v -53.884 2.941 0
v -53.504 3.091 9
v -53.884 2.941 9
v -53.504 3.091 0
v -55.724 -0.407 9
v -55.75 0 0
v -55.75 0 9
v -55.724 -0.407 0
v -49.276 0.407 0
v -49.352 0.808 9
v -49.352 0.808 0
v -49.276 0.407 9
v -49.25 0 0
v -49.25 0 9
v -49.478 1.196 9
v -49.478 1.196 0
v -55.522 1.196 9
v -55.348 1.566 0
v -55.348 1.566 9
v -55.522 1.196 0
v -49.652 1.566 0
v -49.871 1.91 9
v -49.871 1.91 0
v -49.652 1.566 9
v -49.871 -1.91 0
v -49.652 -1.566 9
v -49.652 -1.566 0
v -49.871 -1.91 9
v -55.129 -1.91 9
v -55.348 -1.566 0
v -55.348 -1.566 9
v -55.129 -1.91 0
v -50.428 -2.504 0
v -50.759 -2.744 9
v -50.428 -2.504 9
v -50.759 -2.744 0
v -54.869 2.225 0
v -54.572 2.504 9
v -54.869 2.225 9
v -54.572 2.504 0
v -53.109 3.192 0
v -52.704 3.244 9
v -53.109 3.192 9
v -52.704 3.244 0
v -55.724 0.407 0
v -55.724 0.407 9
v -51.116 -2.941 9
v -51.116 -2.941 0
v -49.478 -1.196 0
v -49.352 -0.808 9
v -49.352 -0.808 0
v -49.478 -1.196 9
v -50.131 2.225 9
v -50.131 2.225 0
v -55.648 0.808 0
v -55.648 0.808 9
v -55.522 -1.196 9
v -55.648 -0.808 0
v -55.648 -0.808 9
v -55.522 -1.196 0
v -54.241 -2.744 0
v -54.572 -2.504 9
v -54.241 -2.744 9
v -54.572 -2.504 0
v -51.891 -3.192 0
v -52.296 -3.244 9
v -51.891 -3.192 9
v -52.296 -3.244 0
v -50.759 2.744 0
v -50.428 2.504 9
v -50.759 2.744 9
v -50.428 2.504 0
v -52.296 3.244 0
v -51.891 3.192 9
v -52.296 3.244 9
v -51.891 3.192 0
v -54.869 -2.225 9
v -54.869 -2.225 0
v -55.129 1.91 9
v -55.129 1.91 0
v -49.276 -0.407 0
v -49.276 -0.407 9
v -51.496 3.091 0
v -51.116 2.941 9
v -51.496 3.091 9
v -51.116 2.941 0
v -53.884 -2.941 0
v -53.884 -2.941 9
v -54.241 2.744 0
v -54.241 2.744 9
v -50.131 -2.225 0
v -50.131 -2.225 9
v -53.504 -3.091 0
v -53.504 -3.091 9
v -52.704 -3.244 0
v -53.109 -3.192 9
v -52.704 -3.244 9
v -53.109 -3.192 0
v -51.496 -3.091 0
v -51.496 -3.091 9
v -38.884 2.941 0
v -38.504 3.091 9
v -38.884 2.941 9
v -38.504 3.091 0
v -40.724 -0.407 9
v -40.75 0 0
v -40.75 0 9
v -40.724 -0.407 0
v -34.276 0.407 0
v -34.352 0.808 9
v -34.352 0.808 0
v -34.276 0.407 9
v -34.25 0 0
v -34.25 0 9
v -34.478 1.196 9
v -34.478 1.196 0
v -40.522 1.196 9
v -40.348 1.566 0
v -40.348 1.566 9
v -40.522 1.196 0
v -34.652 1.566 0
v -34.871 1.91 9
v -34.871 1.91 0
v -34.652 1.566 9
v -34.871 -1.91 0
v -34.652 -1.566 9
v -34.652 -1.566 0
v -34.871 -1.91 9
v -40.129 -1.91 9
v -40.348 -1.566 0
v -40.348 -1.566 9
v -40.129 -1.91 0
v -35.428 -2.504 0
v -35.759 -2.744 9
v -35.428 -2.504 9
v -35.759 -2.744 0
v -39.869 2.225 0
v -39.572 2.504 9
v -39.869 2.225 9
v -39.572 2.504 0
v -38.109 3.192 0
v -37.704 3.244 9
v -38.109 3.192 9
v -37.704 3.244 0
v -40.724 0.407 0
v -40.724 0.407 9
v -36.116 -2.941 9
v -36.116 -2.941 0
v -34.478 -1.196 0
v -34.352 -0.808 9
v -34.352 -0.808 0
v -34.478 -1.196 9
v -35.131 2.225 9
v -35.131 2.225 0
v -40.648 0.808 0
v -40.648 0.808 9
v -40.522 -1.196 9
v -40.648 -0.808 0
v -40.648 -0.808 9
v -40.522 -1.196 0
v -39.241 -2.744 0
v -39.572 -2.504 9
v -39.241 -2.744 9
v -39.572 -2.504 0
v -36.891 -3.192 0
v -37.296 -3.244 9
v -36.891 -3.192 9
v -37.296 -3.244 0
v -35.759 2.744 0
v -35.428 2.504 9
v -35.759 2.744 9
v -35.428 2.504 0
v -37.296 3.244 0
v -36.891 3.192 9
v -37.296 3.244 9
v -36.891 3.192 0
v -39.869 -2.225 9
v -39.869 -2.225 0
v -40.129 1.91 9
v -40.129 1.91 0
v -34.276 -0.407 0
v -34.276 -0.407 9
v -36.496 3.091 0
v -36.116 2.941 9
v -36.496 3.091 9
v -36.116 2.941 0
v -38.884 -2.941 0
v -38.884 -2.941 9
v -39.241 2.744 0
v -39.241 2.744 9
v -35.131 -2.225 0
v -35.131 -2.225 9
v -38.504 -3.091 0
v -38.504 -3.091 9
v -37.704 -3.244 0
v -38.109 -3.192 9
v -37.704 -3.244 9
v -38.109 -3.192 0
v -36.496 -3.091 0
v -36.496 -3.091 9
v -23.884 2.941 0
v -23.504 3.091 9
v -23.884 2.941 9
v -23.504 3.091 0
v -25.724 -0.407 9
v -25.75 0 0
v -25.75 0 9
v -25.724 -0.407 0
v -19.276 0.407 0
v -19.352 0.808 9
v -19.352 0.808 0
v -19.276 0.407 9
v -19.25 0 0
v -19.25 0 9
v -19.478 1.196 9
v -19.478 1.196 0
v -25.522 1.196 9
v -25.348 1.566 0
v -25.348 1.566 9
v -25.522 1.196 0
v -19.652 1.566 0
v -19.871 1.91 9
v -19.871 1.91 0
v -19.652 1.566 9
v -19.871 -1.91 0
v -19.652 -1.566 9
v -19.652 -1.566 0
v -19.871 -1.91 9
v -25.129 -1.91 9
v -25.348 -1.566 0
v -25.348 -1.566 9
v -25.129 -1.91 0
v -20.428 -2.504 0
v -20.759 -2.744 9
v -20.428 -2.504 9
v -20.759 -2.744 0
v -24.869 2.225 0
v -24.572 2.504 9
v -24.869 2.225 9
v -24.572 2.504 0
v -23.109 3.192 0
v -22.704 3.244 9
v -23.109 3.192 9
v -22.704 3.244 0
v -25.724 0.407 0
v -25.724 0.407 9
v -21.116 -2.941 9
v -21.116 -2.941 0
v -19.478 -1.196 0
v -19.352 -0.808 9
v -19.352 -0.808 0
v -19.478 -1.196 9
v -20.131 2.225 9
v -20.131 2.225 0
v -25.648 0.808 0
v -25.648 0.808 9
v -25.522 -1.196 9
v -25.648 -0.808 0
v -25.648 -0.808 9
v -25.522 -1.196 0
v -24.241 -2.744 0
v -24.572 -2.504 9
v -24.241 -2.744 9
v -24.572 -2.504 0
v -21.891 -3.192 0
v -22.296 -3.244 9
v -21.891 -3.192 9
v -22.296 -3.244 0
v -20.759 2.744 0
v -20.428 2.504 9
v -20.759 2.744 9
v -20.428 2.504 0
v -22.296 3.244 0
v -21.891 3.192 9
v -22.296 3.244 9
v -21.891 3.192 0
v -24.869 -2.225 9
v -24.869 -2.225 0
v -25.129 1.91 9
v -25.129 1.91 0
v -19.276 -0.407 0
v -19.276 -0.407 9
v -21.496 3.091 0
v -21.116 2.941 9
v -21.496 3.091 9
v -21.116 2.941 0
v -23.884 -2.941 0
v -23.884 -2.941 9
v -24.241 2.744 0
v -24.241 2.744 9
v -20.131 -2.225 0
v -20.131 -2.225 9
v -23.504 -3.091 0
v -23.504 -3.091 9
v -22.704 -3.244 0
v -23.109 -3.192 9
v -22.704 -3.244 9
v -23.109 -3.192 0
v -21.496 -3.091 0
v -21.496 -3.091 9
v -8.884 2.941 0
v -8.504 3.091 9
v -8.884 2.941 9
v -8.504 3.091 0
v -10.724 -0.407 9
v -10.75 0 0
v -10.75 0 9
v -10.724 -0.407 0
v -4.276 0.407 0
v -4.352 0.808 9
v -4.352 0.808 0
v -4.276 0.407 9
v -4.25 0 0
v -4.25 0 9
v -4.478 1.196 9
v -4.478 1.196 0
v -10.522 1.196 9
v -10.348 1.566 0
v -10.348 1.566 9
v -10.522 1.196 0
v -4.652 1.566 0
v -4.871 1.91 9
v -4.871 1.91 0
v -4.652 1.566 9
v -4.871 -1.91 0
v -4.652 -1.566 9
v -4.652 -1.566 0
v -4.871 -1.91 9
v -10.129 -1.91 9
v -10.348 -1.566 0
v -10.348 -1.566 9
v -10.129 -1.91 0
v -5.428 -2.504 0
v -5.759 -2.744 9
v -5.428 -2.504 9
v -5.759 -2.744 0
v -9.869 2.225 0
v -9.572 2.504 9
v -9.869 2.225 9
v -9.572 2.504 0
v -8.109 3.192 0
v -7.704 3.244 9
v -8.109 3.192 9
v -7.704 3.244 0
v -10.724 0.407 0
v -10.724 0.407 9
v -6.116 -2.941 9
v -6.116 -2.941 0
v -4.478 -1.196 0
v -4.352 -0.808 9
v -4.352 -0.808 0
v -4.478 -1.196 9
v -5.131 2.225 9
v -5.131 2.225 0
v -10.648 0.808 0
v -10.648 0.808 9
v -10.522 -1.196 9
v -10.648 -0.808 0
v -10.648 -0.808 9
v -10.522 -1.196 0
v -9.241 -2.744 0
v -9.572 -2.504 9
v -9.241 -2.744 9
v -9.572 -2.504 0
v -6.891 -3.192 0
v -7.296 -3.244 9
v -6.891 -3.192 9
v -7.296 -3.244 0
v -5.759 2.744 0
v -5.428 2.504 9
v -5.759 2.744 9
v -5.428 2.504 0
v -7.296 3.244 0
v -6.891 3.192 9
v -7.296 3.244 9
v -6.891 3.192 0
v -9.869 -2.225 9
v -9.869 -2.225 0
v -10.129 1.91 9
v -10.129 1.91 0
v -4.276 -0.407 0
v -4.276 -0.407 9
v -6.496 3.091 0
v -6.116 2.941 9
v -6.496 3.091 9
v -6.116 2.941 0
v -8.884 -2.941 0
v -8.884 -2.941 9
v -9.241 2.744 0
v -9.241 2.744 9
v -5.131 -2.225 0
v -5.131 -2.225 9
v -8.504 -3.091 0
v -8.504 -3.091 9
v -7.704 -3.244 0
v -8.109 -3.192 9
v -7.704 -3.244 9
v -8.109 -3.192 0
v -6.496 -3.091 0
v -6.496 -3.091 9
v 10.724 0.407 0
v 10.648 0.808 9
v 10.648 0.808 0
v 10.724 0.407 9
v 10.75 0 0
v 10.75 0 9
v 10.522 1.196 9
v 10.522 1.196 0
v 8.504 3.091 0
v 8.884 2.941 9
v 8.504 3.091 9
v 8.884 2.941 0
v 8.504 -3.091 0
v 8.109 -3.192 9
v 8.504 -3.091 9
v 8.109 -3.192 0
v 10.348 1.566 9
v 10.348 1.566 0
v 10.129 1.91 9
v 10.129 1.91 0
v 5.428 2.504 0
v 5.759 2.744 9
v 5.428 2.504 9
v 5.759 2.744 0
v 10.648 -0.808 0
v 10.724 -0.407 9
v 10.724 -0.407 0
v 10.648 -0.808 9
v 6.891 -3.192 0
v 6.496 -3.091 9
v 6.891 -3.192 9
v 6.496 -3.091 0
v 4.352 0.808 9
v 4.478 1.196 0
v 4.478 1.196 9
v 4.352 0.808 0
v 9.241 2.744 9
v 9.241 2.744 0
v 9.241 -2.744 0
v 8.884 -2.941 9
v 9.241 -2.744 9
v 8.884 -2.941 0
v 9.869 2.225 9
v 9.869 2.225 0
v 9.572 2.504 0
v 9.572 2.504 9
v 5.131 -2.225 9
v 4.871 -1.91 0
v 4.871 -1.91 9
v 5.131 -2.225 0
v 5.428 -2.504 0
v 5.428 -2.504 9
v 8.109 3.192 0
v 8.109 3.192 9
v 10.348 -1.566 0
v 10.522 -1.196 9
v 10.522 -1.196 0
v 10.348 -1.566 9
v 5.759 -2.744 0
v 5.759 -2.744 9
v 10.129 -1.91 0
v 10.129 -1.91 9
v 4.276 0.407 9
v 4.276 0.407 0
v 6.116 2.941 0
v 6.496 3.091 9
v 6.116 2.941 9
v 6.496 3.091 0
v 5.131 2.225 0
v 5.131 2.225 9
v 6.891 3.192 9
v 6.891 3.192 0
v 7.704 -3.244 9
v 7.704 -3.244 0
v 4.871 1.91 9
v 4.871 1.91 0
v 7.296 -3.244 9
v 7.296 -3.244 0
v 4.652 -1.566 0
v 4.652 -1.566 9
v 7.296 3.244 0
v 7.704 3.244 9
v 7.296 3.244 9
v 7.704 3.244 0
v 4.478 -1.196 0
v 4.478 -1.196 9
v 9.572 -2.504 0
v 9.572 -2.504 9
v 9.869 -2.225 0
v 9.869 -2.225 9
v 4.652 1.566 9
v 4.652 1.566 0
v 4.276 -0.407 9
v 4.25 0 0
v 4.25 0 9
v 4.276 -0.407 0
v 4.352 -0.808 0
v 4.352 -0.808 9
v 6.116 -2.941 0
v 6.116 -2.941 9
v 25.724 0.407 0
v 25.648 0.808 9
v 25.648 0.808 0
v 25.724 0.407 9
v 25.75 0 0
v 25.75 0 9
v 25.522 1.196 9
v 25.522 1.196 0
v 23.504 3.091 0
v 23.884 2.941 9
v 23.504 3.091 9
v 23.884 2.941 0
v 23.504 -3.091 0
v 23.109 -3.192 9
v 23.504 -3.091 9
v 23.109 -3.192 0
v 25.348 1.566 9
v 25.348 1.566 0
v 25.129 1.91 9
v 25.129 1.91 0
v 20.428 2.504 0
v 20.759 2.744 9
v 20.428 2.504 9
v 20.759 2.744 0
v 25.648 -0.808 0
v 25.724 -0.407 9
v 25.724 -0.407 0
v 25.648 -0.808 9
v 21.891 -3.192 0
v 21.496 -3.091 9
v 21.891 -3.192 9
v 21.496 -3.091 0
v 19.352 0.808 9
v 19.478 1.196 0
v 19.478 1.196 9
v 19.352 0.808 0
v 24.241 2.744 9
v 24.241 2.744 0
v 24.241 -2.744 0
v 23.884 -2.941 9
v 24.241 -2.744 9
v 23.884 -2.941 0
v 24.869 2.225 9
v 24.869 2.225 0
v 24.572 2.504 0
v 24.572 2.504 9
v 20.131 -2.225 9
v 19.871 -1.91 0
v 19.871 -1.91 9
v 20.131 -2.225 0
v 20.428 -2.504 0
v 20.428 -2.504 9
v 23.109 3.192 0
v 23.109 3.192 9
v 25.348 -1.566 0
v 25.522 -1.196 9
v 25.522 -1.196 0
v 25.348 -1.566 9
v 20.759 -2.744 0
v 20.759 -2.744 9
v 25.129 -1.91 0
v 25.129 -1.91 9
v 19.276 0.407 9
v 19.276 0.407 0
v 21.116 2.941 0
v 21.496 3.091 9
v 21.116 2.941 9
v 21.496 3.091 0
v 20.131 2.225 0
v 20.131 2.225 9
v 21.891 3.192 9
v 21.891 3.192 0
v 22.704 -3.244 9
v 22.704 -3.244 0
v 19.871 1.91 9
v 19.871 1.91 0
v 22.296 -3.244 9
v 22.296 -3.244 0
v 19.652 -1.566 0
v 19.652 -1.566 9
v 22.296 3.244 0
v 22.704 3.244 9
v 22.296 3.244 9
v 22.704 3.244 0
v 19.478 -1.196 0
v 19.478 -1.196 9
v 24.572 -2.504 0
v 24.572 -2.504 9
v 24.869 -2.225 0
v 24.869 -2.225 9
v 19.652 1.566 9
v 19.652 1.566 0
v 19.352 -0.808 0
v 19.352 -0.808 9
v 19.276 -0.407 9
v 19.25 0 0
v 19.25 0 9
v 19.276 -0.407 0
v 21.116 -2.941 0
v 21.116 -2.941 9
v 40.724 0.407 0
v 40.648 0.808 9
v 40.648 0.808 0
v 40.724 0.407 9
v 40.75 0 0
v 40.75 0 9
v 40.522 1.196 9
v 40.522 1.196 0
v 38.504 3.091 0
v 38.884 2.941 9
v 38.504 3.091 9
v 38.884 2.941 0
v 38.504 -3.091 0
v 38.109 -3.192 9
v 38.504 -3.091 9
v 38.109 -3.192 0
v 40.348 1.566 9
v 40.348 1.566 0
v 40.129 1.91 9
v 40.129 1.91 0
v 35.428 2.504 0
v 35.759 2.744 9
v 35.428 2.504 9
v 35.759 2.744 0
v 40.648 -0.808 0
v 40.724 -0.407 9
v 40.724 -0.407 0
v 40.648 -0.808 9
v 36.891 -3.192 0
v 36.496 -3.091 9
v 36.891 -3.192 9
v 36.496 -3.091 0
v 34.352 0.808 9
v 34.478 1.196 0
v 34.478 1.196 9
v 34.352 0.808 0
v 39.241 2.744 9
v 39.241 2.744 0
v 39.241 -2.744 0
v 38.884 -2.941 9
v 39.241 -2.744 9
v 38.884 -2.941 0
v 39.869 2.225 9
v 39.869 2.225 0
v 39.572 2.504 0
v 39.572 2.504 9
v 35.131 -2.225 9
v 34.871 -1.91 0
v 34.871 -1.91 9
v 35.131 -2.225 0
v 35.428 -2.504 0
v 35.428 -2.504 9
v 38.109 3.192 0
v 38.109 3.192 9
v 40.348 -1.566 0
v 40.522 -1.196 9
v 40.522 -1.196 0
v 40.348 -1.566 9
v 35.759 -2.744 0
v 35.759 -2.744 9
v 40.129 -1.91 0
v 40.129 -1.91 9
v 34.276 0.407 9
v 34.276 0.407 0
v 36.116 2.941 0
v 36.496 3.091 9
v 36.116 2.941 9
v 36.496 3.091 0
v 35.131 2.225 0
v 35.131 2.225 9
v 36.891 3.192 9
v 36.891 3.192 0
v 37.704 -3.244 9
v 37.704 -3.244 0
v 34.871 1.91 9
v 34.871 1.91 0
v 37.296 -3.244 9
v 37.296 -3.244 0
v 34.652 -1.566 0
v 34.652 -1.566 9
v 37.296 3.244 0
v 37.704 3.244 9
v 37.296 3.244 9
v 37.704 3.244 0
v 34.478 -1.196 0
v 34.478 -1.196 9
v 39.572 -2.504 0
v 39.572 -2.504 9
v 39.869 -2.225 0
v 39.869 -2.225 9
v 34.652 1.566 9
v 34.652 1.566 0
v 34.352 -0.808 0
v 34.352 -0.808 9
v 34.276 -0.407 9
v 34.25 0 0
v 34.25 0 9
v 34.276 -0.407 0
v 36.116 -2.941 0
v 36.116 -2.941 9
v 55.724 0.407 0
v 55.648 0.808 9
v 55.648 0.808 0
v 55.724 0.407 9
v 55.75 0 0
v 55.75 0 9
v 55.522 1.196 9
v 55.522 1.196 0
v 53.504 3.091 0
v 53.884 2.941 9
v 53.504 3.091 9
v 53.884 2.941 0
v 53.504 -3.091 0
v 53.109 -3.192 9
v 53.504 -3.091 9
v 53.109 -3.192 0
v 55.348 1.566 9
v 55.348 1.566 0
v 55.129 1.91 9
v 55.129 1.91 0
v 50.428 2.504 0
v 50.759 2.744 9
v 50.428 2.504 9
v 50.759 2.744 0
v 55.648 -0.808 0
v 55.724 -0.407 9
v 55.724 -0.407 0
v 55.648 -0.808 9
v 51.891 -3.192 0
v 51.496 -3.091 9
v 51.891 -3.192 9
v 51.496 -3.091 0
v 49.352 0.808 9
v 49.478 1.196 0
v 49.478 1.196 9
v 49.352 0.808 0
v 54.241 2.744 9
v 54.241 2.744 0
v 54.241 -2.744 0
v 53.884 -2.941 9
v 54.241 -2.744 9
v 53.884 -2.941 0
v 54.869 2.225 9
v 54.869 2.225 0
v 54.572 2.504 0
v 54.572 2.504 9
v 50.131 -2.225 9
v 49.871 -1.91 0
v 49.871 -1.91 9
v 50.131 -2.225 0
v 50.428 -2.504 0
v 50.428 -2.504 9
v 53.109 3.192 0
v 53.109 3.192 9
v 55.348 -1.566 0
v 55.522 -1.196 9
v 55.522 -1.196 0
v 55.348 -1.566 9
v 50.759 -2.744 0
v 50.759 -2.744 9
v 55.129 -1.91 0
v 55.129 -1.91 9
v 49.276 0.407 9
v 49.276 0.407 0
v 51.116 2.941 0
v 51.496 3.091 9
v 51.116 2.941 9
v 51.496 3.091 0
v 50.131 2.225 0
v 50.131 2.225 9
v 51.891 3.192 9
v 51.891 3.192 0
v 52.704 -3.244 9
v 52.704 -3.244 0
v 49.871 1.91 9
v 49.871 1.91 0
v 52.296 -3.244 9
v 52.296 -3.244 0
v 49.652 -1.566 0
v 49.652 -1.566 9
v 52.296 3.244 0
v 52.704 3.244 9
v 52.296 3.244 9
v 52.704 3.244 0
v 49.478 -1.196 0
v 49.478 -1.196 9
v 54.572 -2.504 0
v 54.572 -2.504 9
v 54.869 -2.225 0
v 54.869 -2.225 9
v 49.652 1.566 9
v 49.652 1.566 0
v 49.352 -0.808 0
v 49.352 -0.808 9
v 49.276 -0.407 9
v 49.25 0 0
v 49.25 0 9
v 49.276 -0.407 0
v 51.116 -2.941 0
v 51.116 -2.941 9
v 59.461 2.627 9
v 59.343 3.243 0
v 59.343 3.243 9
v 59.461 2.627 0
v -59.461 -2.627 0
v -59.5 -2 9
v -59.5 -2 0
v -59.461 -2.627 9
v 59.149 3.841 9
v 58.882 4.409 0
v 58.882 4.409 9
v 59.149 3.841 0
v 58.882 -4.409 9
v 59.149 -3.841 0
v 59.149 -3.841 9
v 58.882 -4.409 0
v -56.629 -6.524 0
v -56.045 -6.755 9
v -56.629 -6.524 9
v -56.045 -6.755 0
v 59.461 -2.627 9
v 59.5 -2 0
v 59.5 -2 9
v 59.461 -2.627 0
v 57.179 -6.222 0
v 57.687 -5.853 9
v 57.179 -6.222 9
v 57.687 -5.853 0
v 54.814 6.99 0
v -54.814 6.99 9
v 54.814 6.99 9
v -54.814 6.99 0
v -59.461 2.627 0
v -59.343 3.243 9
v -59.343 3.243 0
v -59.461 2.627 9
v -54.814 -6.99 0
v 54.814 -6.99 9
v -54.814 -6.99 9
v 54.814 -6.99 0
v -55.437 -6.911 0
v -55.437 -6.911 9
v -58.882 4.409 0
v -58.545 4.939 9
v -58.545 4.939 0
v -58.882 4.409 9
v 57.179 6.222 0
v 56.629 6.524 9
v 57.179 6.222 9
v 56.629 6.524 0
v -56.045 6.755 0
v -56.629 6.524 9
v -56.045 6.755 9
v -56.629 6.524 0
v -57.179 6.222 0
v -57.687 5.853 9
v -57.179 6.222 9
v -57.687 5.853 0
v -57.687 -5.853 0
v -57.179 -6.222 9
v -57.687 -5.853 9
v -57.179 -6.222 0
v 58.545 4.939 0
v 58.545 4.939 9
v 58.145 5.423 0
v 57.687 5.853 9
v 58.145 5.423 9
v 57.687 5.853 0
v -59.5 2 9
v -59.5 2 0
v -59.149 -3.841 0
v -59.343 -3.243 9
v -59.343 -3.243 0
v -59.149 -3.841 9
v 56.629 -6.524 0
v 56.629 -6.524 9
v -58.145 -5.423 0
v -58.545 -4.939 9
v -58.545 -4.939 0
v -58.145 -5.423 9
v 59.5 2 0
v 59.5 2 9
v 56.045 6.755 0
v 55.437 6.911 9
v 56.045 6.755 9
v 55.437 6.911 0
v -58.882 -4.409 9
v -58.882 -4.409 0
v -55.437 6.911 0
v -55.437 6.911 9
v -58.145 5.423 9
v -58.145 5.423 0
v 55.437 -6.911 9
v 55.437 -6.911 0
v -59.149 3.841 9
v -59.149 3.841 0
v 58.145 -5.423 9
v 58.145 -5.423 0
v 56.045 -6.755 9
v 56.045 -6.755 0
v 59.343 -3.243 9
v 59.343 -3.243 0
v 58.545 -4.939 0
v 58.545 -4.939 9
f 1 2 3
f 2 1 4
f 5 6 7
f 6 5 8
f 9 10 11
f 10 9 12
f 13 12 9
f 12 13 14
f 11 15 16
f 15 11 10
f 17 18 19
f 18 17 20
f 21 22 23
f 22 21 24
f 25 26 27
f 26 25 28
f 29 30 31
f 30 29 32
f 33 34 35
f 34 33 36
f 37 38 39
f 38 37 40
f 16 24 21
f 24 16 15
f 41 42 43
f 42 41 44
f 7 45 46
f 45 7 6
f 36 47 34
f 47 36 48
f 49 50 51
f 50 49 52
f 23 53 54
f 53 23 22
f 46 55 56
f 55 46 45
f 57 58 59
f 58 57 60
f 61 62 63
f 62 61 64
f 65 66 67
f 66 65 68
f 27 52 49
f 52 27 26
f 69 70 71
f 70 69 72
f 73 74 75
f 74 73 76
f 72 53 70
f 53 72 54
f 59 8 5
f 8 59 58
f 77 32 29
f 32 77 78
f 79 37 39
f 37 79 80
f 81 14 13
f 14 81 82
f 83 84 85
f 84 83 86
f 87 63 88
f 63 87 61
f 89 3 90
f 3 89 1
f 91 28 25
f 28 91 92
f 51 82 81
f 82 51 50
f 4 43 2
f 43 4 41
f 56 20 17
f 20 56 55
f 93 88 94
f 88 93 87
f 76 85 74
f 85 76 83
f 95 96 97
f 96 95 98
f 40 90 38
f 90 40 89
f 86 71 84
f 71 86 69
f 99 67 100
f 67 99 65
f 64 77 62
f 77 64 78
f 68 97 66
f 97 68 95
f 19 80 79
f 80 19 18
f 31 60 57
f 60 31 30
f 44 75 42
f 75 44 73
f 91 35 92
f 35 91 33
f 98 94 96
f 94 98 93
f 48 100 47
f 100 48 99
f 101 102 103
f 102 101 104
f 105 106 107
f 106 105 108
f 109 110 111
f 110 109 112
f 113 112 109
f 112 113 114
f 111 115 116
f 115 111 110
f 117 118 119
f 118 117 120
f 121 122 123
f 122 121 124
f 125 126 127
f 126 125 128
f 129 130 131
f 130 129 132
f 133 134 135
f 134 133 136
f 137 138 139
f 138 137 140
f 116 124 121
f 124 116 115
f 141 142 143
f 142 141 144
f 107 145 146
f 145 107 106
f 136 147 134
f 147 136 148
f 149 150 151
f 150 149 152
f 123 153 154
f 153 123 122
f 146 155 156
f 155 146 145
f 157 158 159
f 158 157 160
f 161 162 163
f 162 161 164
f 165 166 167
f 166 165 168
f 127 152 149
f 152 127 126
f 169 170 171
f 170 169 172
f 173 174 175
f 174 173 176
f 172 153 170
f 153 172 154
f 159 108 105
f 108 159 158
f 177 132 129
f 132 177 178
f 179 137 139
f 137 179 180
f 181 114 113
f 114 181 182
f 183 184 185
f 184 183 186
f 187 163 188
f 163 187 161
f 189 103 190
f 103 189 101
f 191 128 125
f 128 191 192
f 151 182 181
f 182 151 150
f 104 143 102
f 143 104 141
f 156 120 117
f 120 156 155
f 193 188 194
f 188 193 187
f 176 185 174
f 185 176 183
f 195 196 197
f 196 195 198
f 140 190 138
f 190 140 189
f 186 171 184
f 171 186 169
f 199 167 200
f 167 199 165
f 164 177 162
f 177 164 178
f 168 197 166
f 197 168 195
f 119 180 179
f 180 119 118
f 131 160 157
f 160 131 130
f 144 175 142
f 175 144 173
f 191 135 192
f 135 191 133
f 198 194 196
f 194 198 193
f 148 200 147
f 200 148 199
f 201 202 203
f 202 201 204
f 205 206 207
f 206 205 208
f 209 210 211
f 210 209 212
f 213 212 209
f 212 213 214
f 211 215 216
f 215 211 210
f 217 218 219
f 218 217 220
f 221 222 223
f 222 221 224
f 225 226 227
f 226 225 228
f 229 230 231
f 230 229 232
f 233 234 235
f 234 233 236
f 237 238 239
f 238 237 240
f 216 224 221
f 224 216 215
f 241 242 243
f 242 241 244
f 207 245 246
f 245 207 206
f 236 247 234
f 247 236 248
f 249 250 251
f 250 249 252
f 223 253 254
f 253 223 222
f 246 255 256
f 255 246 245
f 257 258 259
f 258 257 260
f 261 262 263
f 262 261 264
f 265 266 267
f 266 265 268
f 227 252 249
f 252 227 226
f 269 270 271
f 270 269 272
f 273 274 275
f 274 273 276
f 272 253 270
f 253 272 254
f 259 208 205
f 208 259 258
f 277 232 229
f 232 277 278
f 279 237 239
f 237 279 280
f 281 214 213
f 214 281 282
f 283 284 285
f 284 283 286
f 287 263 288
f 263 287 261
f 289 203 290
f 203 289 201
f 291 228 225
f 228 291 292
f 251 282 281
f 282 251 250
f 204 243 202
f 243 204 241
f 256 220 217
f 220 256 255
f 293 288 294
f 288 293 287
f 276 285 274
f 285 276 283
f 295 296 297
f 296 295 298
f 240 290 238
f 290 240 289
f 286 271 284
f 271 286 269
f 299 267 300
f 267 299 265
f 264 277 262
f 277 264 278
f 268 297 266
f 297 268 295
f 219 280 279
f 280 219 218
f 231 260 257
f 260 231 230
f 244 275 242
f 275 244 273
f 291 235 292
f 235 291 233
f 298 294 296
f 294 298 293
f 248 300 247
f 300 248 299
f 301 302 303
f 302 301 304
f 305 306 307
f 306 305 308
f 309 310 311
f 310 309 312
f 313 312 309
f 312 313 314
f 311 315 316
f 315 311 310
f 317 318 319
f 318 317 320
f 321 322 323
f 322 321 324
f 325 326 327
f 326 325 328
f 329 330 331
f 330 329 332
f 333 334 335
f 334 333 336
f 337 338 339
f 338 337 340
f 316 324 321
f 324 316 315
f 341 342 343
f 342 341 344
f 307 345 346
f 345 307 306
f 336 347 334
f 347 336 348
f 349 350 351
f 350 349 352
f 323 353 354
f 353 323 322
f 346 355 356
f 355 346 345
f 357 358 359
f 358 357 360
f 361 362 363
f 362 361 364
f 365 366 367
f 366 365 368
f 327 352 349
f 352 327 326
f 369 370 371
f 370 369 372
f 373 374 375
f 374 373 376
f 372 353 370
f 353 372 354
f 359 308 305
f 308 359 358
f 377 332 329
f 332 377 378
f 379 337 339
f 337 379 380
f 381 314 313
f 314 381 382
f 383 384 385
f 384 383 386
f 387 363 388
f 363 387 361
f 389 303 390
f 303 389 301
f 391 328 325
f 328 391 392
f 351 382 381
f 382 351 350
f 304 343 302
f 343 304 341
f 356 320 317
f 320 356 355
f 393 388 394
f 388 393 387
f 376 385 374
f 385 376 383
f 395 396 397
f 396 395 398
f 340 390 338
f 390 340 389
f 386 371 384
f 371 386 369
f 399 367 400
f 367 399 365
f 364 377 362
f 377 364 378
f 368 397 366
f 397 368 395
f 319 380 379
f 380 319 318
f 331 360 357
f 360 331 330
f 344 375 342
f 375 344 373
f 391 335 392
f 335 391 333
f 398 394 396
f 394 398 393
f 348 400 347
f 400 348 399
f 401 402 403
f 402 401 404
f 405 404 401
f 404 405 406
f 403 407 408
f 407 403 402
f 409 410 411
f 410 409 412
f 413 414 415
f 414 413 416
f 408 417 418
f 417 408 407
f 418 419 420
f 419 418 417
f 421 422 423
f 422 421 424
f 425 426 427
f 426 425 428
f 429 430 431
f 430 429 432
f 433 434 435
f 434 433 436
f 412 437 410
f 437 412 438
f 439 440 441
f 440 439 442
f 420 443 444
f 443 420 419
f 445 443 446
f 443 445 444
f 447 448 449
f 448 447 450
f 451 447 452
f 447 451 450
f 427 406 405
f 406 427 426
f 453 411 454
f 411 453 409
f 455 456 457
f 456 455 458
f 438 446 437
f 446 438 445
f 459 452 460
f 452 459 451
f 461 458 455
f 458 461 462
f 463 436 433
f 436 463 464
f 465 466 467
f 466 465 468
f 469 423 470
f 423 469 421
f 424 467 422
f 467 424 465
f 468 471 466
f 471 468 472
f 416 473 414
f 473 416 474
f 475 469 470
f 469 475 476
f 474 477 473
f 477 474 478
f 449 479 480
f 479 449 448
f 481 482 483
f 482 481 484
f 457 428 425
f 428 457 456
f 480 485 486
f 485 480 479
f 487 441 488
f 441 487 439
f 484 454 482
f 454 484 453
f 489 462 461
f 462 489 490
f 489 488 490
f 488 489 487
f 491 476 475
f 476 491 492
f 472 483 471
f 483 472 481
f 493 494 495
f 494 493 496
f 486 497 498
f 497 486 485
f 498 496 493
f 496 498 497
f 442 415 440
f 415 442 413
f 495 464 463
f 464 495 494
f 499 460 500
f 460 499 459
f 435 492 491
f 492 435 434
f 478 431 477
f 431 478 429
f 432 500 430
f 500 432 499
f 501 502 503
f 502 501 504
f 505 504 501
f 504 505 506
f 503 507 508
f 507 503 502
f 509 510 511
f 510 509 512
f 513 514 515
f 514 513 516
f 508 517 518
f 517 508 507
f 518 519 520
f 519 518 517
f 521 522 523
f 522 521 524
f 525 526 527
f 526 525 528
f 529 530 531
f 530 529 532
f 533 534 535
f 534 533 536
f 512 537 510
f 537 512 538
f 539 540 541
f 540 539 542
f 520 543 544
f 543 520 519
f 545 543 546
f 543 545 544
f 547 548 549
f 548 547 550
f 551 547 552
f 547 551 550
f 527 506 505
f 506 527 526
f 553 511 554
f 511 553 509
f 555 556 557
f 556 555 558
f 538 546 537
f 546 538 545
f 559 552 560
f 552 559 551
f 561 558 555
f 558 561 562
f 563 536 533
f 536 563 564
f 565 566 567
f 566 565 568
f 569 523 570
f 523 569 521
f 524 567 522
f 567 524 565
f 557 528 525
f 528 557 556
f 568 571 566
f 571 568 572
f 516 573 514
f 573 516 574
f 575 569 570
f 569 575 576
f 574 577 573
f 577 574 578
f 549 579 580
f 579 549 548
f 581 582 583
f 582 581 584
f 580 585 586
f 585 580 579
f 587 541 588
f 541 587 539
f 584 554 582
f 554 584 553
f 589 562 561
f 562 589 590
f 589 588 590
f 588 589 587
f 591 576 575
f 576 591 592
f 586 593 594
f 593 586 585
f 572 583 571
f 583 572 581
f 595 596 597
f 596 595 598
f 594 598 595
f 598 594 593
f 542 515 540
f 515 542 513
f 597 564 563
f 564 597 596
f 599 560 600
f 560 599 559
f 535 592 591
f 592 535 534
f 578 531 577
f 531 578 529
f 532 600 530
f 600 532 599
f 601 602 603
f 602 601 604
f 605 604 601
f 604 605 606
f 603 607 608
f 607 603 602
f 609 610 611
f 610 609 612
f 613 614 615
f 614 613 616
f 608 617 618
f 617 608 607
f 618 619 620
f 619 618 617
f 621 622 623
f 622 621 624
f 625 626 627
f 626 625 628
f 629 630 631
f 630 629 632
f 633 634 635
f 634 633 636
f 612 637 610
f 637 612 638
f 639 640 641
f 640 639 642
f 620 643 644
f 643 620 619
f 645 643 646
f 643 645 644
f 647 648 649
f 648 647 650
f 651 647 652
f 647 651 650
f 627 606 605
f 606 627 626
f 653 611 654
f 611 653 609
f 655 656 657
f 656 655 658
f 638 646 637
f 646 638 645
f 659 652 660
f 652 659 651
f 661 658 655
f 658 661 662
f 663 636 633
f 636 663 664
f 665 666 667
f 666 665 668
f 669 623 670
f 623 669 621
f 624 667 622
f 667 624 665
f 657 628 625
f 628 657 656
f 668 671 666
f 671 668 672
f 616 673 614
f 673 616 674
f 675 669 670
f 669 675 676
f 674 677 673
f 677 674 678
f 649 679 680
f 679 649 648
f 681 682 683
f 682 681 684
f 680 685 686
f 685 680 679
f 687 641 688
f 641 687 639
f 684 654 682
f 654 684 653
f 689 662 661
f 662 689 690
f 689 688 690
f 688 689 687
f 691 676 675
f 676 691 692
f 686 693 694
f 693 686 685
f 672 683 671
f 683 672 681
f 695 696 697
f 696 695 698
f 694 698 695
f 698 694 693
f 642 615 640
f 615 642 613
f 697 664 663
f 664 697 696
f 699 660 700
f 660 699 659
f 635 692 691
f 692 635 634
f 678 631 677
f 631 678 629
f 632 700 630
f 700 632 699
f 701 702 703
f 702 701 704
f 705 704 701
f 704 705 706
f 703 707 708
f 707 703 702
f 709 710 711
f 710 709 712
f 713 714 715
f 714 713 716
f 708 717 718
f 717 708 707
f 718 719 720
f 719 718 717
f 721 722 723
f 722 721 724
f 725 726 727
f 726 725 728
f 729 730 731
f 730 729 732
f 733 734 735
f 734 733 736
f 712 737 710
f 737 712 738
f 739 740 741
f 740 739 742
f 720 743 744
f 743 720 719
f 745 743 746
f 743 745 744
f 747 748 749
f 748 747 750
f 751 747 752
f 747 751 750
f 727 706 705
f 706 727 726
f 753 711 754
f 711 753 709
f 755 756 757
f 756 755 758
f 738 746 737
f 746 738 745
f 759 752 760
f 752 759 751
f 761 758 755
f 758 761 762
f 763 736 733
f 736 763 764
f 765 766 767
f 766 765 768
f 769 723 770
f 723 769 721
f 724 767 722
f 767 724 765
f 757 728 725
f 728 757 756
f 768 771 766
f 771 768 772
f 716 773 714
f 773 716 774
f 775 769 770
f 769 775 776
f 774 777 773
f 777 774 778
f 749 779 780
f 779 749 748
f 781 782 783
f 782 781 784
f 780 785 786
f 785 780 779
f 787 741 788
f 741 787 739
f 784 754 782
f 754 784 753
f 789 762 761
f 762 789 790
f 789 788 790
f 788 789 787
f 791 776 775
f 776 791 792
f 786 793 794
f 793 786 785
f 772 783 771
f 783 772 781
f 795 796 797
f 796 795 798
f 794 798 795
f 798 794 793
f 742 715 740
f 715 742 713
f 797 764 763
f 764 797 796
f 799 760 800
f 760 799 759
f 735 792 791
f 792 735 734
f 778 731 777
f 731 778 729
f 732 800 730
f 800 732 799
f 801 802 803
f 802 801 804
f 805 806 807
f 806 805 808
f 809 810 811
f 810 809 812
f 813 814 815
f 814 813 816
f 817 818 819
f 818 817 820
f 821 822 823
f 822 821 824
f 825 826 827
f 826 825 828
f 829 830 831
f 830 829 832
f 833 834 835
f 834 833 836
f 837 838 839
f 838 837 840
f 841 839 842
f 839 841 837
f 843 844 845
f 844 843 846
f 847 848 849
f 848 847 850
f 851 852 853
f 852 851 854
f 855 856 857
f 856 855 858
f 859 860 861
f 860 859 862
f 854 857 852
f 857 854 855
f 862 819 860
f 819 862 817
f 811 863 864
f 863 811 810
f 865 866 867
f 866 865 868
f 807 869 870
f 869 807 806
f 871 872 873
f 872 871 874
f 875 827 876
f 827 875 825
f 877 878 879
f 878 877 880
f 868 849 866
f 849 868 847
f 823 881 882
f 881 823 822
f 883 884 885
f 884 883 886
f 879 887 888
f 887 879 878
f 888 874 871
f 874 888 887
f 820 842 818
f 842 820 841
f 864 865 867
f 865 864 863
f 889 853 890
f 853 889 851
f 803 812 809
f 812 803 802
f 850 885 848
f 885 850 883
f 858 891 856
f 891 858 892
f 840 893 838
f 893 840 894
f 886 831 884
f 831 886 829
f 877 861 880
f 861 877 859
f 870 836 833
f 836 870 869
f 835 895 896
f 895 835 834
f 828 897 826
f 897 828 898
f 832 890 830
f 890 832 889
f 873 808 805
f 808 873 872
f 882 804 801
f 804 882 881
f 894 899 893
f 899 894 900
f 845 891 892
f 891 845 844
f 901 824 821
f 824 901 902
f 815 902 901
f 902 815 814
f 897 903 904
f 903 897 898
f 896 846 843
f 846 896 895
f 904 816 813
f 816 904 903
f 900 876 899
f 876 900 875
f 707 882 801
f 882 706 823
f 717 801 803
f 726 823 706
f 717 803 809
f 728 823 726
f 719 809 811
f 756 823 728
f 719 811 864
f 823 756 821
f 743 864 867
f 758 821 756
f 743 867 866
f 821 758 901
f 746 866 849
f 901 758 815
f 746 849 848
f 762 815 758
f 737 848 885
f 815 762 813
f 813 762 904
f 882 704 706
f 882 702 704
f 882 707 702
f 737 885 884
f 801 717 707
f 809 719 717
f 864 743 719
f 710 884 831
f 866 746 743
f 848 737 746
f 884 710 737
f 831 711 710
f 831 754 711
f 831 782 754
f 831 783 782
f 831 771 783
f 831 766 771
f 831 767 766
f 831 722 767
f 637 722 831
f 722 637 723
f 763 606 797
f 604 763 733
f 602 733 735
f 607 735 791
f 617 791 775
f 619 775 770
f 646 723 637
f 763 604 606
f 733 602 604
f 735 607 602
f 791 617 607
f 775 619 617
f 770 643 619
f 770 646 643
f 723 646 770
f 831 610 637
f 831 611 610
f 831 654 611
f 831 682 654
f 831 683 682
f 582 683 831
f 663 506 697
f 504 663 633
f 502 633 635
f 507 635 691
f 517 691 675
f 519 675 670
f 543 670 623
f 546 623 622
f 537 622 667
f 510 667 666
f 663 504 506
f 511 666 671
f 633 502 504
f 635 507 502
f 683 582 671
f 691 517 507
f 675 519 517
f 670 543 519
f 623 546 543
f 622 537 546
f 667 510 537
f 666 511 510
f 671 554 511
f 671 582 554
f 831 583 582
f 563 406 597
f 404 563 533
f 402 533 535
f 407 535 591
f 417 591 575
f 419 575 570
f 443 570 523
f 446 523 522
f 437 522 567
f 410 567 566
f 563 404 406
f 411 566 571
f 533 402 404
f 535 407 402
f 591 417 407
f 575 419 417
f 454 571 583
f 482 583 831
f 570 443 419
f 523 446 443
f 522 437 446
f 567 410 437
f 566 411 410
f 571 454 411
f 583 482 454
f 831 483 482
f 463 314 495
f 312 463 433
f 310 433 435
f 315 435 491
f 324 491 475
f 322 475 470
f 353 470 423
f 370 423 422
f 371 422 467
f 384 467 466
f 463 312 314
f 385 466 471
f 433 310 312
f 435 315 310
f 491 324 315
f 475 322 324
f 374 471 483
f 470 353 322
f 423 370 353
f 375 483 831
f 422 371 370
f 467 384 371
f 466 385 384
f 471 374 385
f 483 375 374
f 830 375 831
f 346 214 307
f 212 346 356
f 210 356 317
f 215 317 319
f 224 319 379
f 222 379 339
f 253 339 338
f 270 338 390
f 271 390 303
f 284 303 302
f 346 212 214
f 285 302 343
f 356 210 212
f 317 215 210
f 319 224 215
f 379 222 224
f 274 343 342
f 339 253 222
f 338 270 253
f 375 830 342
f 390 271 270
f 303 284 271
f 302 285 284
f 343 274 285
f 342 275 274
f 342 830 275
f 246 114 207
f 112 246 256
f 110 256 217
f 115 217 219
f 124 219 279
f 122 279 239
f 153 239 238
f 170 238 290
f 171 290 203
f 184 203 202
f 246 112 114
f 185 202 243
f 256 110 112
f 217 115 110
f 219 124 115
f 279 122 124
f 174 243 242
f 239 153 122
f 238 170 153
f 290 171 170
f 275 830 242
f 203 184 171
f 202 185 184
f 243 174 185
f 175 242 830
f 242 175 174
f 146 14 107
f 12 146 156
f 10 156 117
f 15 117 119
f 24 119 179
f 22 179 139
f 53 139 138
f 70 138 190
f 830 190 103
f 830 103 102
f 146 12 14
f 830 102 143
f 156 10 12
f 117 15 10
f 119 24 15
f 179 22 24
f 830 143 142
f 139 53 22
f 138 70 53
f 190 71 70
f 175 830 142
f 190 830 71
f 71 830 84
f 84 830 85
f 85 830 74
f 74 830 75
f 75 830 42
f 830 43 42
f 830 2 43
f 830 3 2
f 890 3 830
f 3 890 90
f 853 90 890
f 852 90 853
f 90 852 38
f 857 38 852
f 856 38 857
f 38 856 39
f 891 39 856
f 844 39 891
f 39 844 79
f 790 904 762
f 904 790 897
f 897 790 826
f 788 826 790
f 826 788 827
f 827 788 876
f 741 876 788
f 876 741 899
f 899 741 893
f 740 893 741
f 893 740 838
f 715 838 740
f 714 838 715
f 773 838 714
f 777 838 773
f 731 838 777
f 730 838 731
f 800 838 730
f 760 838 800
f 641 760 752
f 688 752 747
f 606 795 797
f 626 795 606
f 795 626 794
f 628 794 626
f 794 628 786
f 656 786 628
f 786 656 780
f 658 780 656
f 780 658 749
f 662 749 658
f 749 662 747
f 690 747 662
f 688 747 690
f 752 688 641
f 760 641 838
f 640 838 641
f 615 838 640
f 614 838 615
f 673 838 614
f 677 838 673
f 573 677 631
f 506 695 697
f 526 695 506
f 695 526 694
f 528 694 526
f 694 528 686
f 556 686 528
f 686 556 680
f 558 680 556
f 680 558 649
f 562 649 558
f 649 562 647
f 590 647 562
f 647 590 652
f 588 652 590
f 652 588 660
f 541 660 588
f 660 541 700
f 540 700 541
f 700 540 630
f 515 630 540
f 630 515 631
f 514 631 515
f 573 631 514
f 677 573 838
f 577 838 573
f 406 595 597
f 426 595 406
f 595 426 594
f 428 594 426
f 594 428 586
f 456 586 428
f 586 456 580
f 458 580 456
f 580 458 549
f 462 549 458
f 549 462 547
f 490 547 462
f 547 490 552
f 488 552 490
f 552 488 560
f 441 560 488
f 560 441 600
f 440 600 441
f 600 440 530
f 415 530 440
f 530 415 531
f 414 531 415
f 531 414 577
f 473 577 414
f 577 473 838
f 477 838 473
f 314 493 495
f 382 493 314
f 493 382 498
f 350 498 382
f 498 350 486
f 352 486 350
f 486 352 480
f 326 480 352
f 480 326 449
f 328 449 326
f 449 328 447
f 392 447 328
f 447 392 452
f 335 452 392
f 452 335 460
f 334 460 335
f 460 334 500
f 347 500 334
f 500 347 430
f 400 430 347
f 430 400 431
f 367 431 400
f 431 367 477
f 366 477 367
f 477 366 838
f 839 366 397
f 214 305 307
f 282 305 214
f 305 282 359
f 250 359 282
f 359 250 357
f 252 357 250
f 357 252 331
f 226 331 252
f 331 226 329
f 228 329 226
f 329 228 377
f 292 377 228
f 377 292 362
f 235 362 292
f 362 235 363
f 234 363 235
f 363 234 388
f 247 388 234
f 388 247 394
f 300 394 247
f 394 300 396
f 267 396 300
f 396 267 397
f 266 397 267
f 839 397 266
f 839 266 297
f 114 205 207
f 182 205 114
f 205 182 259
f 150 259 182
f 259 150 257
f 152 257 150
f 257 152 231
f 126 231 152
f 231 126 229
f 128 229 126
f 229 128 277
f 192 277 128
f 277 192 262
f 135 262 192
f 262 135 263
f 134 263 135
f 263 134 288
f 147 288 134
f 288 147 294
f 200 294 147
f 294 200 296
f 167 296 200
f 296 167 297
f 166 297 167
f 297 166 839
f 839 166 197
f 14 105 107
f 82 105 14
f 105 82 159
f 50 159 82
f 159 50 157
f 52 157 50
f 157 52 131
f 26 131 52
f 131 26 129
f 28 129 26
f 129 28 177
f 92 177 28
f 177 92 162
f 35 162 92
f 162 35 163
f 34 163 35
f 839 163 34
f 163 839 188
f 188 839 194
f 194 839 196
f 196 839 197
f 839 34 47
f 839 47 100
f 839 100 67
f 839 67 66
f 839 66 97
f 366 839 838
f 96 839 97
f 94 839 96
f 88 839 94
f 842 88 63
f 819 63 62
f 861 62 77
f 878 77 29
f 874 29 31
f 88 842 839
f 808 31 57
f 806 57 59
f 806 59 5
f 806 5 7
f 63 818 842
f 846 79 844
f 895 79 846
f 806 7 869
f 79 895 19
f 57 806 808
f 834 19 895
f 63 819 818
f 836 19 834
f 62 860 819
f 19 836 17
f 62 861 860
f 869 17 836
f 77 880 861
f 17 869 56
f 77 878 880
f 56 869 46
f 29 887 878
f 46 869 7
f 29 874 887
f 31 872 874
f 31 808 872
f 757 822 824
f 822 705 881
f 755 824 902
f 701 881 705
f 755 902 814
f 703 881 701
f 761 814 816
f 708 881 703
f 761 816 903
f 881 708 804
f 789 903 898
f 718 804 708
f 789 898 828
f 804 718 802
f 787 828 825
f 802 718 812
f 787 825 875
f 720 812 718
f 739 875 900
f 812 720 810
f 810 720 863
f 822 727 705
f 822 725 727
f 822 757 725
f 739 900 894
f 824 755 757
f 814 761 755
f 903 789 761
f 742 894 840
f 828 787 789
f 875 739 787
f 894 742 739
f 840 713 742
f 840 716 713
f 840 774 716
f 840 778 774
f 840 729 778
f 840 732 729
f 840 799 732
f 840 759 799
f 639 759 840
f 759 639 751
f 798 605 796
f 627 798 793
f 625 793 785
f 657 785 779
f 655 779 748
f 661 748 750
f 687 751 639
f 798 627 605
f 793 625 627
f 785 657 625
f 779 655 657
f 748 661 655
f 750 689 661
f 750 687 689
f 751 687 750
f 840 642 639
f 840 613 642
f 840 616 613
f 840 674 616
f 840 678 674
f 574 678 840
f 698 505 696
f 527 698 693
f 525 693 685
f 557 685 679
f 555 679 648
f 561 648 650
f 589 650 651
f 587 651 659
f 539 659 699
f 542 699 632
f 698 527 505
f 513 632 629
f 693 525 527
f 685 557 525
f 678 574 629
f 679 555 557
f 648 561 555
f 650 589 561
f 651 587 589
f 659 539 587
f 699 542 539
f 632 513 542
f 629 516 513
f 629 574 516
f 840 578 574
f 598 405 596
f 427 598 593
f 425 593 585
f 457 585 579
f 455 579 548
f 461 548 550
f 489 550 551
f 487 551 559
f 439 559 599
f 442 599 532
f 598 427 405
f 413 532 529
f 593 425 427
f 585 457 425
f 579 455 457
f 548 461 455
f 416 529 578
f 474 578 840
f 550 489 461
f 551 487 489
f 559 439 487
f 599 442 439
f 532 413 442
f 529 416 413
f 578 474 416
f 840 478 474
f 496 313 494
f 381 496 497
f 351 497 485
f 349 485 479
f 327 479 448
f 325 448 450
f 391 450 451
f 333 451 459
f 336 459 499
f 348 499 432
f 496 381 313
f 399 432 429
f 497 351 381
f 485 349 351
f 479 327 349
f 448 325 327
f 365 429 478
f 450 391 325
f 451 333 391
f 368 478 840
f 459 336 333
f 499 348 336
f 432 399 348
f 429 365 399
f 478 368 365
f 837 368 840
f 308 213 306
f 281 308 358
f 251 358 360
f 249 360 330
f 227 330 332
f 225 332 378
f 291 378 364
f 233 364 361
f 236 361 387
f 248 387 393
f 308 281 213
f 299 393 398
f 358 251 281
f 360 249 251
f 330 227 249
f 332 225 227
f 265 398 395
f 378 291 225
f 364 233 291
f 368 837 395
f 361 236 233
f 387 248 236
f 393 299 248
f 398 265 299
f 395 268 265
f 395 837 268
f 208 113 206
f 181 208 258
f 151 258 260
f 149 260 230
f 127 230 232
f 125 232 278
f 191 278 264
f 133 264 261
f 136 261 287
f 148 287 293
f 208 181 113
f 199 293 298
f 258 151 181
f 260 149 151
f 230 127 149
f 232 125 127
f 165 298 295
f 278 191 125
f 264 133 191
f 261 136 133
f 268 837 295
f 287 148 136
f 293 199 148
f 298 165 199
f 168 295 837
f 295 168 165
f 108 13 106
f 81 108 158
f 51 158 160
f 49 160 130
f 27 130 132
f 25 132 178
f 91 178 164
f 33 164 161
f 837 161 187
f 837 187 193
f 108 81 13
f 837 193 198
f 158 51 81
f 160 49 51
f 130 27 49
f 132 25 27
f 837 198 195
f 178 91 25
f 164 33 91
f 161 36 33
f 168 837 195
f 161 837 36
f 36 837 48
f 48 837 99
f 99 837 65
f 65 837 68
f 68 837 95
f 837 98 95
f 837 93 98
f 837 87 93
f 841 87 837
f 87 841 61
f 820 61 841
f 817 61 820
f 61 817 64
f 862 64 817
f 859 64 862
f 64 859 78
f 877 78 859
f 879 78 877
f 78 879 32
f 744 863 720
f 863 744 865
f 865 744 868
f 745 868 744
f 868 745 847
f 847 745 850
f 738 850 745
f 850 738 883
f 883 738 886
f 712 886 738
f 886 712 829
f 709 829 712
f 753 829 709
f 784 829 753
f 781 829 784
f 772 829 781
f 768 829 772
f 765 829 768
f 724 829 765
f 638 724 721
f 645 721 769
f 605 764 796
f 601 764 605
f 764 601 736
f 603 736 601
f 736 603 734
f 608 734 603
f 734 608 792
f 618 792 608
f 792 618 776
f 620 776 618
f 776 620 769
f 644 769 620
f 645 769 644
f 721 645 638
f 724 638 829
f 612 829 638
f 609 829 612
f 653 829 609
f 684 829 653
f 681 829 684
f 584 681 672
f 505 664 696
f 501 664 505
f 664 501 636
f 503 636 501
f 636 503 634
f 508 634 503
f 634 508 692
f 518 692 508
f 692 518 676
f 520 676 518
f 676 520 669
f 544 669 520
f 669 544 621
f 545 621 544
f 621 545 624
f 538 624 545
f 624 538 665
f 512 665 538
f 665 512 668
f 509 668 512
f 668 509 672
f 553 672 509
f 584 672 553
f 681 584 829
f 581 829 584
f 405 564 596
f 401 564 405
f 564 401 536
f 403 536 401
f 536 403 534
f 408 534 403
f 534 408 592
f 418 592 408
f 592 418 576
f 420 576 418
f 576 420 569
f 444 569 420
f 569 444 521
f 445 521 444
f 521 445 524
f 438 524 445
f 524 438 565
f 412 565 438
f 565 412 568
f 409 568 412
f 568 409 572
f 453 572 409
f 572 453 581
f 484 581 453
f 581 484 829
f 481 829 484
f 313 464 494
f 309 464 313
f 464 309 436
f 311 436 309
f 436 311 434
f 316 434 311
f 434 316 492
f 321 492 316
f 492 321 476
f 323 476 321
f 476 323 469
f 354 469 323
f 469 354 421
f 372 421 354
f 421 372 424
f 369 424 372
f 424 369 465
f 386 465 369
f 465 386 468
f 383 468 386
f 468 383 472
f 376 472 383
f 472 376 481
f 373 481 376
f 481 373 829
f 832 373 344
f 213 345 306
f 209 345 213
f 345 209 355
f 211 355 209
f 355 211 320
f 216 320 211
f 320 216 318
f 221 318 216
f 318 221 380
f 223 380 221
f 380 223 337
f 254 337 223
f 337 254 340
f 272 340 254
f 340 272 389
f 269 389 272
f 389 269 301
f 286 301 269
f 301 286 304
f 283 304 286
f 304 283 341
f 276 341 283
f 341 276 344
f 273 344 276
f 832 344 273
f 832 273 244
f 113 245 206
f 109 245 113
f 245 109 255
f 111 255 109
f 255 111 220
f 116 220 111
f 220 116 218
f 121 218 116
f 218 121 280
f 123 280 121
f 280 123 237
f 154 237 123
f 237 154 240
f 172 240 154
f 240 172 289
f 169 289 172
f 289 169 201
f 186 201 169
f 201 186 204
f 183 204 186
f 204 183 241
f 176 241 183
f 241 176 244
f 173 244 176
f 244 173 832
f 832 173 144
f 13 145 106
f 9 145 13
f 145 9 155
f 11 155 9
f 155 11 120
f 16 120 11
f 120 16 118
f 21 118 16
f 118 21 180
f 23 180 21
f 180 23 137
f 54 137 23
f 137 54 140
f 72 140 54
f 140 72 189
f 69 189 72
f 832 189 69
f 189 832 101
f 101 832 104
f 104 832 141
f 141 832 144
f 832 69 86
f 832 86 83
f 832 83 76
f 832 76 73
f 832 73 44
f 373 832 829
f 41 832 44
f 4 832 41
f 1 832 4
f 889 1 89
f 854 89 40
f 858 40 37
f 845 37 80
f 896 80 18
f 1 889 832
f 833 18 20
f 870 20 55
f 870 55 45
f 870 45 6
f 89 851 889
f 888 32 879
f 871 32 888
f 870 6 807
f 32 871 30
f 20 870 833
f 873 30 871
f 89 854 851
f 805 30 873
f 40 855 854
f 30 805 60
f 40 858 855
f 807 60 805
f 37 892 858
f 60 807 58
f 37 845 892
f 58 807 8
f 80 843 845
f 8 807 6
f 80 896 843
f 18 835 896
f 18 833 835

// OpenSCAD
$fn = 50;


difference() {
	union() {
		hull() {
			translate(v = [-54.5000000000, 2.0000000000, 0]) {
				cylinder(h = 9, r = 5);
			}
			translate(v = [54.5000000000, 2.0000000000, 0]) {
				cylinder(h = 9, r = 5);
			}
			translate(v = [-54.5000000000, -2.0000000000, 0]) {
				cylinder(h = 9, r = 5);
			}
			translate(v = [54.5000000000, -2.0000000000, 0]) {
				cylinder(h = 9, r = 5);
			}
		}
	}
	union() {
		translate(v = [-52.5000000000, 0.0000000000, 0]) {
			translate(v = [0, 0, -100]) {
				cylinder(h = 200, r = 3.2500000000);
			}
		}
		translate(v = [-37.5000000000, 0.0000000000, 0]) {
			translate(v = [0, 0, -100]) {
				cylinder(h = 200, r = 3.2500000000);
			}
		}
		translate(v = [-22.5000000000, 0.0000000000, 0]) {
			translate(v = [0, 0, -100]) {
				cylinder(h = 200, r = 3.2500000000);
			}
		}
		translate(v = [-7.5000000000, 0.0000000000, 0]) {
			translate(v = [0, 0, -100]) {
				cylinder(h = 200, r = 3.2500000000);
			}
		}
		translate(v = [7.5000000000, 0.0000000000, 0]) {
			translate(v = [0, 0, -100]) {
				cylinder(h = 200, r = 3.2500000000);
			}
		}
		translate(v = [22.5000000000, 0.0000000000, 0]) {
			translate(v = [0, 0, -100]) {
				cylinder(h = 200, r = 3.2500000000);
			}
		}
		translate(v = [37.5000000000, 0.0000000000, 0]) {
			translate(v = [0, 0, -100]) {
				cylinder(h = 200, r = 3.2500000000);
			}
		}
		translate(v = [52.5000000000, 0.0000000000, 0]) {
			translate(v = [0, 0, -100]) {
				cylinder(h = 200, r = 3.2500000000);
			}
		}
	}
}
